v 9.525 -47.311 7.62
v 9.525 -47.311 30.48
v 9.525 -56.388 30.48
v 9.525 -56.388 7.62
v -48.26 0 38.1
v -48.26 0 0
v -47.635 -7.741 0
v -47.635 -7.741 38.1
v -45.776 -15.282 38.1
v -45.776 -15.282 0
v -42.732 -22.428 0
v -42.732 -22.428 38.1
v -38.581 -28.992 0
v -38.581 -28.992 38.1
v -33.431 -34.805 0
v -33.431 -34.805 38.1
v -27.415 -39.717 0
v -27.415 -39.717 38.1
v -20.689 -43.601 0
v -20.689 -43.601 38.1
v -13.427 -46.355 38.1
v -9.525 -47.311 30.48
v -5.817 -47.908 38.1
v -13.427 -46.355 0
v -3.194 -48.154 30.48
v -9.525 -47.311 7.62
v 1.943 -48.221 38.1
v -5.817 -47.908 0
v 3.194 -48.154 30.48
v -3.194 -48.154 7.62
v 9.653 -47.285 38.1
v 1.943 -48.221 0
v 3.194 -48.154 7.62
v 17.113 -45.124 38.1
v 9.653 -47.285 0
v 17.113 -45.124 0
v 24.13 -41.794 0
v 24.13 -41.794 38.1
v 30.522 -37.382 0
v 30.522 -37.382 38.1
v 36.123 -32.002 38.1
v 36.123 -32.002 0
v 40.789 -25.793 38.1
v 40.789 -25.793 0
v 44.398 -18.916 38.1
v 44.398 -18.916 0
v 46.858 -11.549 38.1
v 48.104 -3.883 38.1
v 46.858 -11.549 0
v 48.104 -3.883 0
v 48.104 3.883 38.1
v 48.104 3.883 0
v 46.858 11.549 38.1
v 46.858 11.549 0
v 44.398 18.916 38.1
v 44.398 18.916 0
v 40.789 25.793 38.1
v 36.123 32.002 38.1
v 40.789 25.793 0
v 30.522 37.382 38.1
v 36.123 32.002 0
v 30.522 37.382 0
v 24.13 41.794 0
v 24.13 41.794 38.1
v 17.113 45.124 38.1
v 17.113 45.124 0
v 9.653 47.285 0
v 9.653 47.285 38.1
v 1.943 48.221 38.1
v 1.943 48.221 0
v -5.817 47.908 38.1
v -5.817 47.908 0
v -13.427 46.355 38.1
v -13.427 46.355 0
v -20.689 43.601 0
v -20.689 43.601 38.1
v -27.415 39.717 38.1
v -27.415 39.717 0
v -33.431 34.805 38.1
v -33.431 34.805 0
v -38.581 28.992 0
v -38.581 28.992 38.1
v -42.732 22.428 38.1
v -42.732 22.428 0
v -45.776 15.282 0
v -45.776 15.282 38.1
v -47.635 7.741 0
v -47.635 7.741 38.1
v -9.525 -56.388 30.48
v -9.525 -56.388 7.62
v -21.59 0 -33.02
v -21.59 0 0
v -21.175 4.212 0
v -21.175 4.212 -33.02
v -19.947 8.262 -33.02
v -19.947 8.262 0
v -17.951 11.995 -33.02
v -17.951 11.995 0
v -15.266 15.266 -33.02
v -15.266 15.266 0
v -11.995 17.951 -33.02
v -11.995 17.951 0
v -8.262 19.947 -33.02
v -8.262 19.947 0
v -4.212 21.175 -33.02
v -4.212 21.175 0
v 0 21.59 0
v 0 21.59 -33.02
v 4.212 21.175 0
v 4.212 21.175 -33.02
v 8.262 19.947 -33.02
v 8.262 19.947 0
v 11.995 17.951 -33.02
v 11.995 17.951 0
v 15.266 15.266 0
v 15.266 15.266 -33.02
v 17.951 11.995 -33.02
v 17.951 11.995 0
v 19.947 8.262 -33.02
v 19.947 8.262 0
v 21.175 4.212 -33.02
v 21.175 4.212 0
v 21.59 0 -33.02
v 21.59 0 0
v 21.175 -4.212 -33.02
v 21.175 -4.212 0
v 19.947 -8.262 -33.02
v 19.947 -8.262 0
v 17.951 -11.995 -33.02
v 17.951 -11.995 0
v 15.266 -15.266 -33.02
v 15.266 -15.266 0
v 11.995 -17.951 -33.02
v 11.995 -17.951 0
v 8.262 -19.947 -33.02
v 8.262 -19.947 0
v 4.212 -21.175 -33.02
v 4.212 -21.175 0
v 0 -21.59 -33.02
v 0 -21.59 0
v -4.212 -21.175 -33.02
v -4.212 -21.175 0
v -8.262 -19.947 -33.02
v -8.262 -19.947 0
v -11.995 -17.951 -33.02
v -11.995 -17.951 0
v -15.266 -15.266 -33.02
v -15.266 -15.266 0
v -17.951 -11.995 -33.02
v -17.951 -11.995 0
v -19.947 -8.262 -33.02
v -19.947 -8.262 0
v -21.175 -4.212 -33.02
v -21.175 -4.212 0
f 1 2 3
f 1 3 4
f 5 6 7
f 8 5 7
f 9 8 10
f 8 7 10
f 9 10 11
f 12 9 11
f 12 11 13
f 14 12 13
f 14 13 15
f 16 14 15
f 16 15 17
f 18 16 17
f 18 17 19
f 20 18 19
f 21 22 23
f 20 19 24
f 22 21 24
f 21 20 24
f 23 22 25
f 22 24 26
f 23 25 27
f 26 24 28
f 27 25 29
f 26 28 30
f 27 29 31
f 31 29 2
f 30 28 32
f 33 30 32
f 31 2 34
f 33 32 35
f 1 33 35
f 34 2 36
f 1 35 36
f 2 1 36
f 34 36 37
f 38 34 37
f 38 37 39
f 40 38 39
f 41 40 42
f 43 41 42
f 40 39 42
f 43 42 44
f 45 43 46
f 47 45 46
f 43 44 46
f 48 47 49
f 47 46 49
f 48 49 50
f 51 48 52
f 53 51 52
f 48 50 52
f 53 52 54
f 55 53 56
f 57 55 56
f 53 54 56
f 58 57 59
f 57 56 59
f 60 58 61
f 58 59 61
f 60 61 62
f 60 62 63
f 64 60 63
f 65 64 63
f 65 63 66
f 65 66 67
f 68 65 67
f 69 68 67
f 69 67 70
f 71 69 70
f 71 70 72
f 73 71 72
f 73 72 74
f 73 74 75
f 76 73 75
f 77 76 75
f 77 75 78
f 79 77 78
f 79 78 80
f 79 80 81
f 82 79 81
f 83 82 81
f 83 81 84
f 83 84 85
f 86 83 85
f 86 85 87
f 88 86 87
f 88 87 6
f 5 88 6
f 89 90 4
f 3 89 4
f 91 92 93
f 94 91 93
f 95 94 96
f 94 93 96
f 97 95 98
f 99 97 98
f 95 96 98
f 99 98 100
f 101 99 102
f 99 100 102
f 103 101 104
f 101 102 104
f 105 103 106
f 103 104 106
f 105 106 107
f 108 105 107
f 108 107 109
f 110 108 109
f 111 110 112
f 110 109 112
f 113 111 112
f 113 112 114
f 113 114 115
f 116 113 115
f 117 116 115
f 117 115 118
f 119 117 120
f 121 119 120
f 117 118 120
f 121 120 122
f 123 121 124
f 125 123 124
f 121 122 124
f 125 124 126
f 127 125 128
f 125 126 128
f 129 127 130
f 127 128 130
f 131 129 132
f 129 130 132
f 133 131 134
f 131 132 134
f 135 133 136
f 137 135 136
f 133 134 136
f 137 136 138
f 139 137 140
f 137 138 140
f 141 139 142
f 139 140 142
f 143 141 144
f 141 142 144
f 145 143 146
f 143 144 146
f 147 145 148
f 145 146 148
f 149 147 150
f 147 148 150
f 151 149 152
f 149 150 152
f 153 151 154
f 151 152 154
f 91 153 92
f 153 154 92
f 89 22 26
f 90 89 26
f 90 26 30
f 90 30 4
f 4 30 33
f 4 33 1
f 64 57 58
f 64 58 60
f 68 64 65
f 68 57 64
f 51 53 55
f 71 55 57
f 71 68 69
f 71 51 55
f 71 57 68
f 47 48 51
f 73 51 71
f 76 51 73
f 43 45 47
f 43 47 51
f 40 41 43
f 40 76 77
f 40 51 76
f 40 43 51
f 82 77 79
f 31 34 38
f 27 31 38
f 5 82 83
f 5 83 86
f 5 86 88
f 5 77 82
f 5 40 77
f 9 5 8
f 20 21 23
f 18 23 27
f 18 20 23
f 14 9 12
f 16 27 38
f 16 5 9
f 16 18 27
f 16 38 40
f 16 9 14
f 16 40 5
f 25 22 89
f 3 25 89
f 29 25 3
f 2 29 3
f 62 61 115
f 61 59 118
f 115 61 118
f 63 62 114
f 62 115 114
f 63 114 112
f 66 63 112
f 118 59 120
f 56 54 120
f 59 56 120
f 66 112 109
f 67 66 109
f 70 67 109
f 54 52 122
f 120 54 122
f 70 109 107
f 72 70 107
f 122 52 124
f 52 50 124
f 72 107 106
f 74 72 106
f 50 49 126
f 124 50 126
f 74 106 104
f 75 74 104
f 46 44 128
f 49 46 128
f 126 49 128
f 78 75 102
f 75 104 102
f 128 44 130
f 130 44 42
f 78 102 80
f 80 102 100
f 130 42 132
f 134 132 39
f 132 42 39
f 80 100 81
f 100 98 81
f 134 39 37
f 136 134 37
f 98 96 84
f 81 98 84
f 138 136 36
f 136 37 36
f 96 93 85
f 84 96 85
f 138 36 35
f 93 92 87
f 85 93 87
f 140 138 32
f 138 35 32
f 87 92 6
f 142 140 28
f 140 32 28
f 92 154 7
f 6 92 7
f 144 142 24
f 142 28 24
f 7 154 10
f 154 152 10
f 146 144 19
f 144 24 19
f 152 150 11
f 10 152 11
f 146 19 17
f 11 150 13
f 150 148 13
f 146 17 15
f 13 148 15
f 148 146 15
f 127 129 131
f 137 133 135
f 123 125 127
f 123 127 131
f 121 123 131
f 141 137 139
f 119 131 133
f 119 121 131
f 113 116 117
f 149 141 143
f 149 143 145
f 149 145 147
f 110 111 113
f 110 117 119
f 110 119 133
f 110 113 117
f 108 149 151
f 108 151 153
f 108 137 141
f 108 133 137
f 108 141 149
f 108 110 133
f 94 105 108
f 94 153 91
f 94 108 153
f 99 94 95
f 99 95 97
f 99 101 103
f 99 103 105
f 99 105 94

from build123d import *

# Parameters (mm, degrees)
SKETCH1_R           = 48.26
BOSS_EXTRUDE1_DEPTH = 38.1
SKETCH2_R           = 21.59
BOSS_EXTRUDE2_DEPTH = 33.02
SKETCH3_W           = 19.05
SKETCH3_H           = 22.86
BOSS_EXTRUDE3_DEPTH = 56.388


with BuildPart() as part:
    # Sketch1 → Boss-Extrude1 (new body)
    with BuildSketch(Plane.XY):
        with Locations(Location((0, 0, 0), (0, 0, 180))):
            Circle(SKETCH1_R)
    extrude(amount=BOSS_EXTRUDE1_DEPTH)

    # Sketch2 → Boss-Extrude2 (add)
    with BuildSketch(Plane(origin=(0, 0, 0), x_dir=(-1, 0, 0), z_dir=(0, 0, -1))):
        Circle(SKETCH2_R)
    extrude(amount=BOSS_EXTRUDE2_DEPTH)

    # Sketch3 → Boss-Extrude3 (add)
    with BuildSketch(Plane(origin=(0, 0, 0), x_dir=(1, 0, 0), z_dir=(0, 1, 0))):
        with Locations((0, -19.05)):
            Rectangle(SKETCH3_W, SKETCH3_H)
    extrude(amount=-BOSS_EXTRUDE3_DEPTH)


solid = part.part
